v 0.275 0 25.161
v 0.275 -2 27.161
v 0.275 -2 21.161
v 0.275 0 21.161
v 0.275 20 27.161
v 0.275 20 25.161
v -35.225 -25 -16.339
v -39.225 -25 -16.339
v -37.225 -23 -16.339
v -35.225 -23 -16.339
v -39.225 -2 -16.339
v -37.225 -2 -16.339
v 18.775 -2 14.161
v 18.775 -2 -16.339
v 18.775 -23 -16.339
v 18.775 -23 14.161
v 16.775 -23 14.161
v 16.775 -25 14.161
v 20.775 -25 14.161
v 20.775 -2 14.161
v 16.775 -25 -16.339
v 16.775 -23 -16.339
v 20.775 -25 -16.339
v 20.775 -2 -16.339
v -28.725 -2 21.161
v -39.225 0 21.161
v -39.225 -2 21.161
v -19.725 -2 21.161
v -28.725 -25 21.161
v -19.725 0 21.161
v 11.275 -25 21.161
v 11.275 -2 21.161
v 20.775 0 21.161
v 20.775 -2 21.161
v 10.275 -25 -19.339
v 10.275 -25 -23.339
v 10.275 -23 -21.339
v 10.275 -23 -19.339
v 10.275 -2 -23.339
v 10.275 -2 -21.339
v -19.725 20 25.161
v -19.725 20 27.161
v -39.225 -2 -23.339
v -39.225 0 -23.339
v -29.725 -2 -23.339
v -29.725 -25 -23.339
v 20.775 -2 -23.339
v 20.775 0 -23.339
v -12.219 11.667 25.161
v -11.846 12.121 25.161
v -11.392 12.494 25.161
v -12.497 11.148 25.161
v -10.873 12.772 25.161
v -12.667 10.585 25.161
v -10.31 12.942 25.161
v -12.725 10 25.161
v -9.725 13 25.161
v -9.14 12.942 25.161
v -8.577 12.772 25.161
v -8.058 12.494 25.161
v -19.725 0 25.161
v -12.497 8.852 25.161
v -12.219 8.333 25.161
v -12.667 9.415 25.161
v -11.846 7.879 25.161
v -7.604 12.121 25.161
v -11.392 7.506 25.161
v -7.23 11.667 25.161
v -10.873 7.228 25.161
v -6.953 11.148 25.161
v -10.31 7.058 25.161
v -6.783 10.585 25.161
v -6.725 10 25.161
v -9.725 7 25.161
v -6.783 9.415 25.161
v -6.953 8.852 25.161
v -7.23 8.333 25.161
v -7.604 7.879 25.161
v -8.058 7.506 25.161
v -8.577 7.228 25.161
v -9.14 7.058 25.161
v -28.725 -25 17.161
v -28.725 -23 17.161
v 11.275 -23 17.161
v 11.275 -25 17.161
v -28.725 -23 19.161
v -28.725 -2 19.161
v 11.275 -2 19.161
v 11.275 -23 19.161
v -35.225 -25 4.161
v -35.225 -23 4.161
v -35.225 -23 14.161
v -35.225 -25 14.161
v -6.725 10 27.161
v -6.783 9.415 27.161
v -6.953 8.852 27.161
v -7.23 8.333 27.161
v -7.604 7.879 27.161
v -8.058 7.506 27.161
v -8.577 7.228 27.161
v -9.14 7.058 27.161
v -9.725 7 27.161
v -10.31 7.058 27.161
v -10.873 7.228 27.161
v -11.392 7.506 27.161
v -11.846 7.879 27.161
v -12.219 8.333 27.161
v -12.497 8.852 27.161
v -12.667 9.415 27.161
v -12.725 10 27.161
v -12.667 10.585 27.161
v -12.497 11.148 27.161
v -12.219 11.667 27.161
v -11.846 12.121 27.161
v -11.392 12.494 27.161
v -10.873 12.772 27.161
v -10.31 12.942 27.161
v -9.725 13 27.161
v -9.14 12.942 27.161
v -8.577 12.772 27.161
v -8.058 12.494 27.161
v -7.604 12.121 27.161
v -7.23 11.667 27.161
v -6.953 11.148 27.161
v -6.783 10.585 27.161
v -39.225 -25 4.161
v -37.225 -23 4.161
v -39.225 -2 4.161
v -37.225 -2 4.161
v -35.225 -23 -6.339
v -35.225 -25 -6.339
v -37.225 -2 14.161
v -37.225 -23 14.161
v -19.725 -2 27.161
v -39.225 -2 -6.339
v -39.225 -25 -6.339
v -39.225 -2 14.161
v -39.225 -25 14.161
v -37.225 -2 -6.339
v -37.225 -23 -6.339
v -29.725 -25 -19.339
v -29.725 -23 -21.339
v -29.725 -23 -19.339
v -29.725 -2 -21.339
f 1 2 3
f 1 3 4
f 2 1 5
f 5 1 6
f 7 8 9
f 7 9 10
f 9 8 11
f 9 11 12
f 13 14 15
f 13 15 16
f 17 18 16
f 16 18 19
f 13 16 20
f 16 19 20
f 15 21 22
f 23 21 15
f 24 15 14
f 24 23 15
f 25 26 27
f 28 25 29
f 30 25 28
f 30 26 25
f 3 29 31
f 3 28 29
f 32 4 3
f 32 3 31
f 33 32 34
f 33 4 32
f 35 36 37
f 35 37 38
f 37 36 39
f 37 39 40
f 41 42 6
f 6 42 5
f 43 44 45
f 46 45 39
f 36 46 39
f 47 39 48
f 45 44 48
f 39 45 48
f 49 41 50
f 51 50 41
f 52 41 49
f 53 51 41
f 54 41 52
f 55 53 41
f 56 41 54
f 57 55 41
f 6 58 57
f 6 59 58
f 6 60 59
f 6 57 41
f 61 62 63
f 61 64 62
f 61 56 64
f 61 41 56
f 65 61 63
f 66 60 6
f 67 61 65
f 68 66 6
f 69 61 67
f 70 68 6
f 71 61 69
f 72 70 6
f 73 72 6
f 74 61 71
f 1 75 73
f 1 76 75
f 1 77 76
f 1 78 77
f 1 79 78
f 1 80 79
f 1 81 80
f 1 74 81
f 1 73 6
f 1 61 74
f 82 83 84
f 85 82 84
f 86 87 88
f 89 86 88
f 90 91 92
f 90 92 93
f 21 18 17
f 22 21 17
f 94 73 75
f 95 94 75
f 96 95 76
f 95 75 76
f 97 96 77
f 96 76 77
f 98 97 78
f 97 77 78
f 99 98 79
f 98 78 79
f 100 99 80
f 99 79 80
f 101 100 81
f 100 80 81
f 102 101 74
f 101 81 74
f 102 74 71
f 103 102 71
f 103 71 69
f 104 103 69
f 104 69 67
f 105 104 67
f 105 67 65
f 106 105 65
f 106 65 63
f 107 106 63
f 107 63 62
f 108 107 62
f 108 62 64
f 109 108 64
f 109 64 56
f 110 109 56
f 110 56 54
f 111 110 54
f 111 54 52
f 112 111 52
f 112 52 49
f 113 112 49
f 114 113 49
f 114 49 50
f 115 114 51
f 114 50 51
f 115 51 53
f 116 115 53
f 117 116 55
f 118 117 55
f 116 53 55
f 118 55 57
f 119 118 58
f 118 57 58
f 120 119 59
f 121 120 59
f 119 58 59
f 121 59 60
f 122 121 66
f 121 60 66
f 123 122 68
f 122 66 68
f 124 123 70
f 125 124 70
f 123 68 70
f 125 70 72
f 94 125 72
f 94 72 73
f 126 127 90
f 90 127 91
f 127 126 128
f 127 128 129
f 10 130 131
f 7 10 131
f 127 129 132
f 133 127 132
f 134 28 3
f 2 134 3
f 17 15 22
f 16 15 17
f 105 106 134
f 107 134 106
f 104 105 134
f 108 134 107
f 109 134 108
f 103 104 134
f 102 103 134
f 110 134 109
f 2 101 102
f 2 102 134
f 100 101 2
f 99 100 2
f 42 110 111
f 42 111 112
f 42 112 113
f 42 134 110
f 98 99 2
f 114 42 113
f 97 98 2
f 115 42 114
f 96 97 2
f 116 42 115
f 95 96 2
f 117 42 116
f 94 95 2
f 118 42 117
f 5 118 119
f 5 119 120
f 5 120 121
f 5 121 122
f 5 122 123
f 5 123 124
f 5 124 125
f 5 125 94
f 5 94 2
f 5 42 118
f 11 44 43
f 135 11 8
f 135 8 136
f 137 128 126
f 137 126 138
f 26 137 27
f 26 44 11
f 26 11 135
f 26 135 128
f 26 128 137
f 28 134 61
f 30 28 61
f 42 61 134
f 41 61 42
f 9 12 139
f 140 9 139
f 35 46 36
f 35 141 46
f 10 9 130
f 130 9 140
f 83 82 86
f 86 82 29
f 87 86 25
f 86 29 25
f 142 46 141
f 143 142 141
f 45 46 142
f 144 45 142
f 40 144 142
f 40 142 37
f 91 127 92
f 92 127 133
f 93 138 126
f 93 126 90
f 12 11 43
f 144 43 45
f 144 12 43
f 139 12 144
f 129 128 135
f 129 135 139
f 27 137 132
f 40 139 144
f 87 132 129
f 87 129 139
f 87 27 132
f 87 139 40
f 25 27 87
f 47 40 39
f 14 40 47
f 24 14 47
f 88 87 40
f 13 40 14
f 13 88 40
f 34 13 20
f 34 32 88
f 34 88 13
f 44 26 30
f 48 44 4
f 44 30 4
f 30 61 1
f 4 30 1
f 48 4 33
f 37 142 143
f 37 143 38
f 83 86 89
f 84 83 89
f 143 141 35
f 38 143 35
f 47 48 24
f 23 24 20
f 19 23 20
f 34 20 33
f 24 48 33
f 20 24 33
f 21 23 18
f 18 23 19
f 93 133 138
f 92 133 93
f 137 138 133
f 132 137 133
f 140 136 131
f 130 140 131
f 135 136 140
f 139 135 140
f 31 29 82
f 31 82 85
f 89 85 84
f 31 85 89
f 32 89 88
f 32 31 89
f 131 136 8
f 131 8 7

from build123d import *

# Parameters (mm, degrees)
F0_W      = 60
F0_H      = 44.5
F1_DEPTH  = 2
F2_W      = 40
F2_H      = 2
F2_W_2    = 2
F2_H_2    = 30.5
F2_H_3    = 10
F3_DEPTH  = 23
F4_W      = 40
F4_H      = 2
F5_DEPTH  = 4
F6_W      = 2
F6_H      = 10
F7_DEPTH  = 4
F8_W      = 40
F8_H      = 2
F9_DEPTH  = 4
F10_W     = 2
F10_H     = 30.5
F11_DEPTH = 4
F12_W     = 20
F12_H     = 2
F13_DEPTH = 6
F14_W     = 20
F14_H     = 2
F15_DEPTH = 22
F16_R     = 3
F17_DEPTH = 3


with BuildPart() as f1:
    # F0 (on Front) → F1 (new body)
    with BuildSketch(Plane.XZ):
        with Locations((-9.224907, -1.08871)):
            Rectangle(F0_W, F0_H)
    extrude(amount=F1_DEPTH)

    # F2 (on face) → F3 (join)
    with BuildSketch(Plane.XZ.offset(2)):
        with Locations((-8.724907, 20.16129)):
            Rectangle(F2_W, F2_H)
        with Locations((-9.724907, -22.33871)):
            Rectangle(F2_W, F2_H)
        with Locations((19.775093, -1.08871)):
            Rectangle(F2_W_2, F2_H_2)
        with Locations((-38.224907, 9.16129)):
            Rectangle(F2_W_2, F2_H_3)
        with Locations((-38.224907, -11.33871)):
            Rectangle(F2_W_2, F2_H_3)
    extrude(amount=F3_DEPTH)

    # F4 (on face) → F5 (join)
    with BuildSketch(Plane(origin=(0, 0, -23.33871), x_dir=(1, 0, 0), z_dir=(0, 0, -1))):
        with Locations((-9.724907, 24)):
            Rectangle(F4_W, F4_H)
    extrude(amount=-F5_DEPTH)

    # F6 (on face) → F7 (join)
    with BuildSketch(Plane(origin=(-39.224907, 0, 0), x_dir=(0, -1, 0), z_dir=(-1, 0, 0))):
        with Locations((24, 9.16129)):
            Rectangle(F6_W, F6_H)
        with Locations((24, -11.33871)):
            Rectangle(F6_W, F6_H)
    extrude(amount=-F7_DEPTH)

    # F8 (on face) → F9 (join)
    with BuildSketch(Plane.XY.offset(21.16129)):
        with Locations((-8.724907, -24)):
            Rectangle(F8_W, F8_H)
    extrude(amount=-F9_DEPTH)

    # F10 (on face) → F11 (join)
    with BuildSketch(Plane.YZ.offset(20.775093)):
        with Locations((-24, -1.08871)):
            Rectangle(F10_W, F10_H)
    extrude(amount=-F11_DEPTH)

    # F12 (on face) → F13 (join)
    with BuildSketch(Plane.XY.offset(21.16129)):
        with Locations((-9.724907, -1)):
            Rectangle(F12_W, F12_H)
    extrude(amount=F13_DEPTH)

    # F14 (on face) → F15 (join)
    with BuildSketch(Plane.XZ.offset(2)):
        with Locations((-9.724907, 26.16129)):
            Rectangle(F14_W, F14_H)
    extrude(amount=-F15_DEPTH)

    # F16 (on face) → F17 (cut)
    with BuildSketch(Plane(origin=(0, 0, 25.16129), x_dir=(1, 0, 0), z_dir=(0, 0, -1))):
        with Locations((-9.724907, -10)):
            Circle(F16_R)
    extrude(amount=-F17_DEPTH, mode=Mode.SUBTRACT)


solid = f1.part
